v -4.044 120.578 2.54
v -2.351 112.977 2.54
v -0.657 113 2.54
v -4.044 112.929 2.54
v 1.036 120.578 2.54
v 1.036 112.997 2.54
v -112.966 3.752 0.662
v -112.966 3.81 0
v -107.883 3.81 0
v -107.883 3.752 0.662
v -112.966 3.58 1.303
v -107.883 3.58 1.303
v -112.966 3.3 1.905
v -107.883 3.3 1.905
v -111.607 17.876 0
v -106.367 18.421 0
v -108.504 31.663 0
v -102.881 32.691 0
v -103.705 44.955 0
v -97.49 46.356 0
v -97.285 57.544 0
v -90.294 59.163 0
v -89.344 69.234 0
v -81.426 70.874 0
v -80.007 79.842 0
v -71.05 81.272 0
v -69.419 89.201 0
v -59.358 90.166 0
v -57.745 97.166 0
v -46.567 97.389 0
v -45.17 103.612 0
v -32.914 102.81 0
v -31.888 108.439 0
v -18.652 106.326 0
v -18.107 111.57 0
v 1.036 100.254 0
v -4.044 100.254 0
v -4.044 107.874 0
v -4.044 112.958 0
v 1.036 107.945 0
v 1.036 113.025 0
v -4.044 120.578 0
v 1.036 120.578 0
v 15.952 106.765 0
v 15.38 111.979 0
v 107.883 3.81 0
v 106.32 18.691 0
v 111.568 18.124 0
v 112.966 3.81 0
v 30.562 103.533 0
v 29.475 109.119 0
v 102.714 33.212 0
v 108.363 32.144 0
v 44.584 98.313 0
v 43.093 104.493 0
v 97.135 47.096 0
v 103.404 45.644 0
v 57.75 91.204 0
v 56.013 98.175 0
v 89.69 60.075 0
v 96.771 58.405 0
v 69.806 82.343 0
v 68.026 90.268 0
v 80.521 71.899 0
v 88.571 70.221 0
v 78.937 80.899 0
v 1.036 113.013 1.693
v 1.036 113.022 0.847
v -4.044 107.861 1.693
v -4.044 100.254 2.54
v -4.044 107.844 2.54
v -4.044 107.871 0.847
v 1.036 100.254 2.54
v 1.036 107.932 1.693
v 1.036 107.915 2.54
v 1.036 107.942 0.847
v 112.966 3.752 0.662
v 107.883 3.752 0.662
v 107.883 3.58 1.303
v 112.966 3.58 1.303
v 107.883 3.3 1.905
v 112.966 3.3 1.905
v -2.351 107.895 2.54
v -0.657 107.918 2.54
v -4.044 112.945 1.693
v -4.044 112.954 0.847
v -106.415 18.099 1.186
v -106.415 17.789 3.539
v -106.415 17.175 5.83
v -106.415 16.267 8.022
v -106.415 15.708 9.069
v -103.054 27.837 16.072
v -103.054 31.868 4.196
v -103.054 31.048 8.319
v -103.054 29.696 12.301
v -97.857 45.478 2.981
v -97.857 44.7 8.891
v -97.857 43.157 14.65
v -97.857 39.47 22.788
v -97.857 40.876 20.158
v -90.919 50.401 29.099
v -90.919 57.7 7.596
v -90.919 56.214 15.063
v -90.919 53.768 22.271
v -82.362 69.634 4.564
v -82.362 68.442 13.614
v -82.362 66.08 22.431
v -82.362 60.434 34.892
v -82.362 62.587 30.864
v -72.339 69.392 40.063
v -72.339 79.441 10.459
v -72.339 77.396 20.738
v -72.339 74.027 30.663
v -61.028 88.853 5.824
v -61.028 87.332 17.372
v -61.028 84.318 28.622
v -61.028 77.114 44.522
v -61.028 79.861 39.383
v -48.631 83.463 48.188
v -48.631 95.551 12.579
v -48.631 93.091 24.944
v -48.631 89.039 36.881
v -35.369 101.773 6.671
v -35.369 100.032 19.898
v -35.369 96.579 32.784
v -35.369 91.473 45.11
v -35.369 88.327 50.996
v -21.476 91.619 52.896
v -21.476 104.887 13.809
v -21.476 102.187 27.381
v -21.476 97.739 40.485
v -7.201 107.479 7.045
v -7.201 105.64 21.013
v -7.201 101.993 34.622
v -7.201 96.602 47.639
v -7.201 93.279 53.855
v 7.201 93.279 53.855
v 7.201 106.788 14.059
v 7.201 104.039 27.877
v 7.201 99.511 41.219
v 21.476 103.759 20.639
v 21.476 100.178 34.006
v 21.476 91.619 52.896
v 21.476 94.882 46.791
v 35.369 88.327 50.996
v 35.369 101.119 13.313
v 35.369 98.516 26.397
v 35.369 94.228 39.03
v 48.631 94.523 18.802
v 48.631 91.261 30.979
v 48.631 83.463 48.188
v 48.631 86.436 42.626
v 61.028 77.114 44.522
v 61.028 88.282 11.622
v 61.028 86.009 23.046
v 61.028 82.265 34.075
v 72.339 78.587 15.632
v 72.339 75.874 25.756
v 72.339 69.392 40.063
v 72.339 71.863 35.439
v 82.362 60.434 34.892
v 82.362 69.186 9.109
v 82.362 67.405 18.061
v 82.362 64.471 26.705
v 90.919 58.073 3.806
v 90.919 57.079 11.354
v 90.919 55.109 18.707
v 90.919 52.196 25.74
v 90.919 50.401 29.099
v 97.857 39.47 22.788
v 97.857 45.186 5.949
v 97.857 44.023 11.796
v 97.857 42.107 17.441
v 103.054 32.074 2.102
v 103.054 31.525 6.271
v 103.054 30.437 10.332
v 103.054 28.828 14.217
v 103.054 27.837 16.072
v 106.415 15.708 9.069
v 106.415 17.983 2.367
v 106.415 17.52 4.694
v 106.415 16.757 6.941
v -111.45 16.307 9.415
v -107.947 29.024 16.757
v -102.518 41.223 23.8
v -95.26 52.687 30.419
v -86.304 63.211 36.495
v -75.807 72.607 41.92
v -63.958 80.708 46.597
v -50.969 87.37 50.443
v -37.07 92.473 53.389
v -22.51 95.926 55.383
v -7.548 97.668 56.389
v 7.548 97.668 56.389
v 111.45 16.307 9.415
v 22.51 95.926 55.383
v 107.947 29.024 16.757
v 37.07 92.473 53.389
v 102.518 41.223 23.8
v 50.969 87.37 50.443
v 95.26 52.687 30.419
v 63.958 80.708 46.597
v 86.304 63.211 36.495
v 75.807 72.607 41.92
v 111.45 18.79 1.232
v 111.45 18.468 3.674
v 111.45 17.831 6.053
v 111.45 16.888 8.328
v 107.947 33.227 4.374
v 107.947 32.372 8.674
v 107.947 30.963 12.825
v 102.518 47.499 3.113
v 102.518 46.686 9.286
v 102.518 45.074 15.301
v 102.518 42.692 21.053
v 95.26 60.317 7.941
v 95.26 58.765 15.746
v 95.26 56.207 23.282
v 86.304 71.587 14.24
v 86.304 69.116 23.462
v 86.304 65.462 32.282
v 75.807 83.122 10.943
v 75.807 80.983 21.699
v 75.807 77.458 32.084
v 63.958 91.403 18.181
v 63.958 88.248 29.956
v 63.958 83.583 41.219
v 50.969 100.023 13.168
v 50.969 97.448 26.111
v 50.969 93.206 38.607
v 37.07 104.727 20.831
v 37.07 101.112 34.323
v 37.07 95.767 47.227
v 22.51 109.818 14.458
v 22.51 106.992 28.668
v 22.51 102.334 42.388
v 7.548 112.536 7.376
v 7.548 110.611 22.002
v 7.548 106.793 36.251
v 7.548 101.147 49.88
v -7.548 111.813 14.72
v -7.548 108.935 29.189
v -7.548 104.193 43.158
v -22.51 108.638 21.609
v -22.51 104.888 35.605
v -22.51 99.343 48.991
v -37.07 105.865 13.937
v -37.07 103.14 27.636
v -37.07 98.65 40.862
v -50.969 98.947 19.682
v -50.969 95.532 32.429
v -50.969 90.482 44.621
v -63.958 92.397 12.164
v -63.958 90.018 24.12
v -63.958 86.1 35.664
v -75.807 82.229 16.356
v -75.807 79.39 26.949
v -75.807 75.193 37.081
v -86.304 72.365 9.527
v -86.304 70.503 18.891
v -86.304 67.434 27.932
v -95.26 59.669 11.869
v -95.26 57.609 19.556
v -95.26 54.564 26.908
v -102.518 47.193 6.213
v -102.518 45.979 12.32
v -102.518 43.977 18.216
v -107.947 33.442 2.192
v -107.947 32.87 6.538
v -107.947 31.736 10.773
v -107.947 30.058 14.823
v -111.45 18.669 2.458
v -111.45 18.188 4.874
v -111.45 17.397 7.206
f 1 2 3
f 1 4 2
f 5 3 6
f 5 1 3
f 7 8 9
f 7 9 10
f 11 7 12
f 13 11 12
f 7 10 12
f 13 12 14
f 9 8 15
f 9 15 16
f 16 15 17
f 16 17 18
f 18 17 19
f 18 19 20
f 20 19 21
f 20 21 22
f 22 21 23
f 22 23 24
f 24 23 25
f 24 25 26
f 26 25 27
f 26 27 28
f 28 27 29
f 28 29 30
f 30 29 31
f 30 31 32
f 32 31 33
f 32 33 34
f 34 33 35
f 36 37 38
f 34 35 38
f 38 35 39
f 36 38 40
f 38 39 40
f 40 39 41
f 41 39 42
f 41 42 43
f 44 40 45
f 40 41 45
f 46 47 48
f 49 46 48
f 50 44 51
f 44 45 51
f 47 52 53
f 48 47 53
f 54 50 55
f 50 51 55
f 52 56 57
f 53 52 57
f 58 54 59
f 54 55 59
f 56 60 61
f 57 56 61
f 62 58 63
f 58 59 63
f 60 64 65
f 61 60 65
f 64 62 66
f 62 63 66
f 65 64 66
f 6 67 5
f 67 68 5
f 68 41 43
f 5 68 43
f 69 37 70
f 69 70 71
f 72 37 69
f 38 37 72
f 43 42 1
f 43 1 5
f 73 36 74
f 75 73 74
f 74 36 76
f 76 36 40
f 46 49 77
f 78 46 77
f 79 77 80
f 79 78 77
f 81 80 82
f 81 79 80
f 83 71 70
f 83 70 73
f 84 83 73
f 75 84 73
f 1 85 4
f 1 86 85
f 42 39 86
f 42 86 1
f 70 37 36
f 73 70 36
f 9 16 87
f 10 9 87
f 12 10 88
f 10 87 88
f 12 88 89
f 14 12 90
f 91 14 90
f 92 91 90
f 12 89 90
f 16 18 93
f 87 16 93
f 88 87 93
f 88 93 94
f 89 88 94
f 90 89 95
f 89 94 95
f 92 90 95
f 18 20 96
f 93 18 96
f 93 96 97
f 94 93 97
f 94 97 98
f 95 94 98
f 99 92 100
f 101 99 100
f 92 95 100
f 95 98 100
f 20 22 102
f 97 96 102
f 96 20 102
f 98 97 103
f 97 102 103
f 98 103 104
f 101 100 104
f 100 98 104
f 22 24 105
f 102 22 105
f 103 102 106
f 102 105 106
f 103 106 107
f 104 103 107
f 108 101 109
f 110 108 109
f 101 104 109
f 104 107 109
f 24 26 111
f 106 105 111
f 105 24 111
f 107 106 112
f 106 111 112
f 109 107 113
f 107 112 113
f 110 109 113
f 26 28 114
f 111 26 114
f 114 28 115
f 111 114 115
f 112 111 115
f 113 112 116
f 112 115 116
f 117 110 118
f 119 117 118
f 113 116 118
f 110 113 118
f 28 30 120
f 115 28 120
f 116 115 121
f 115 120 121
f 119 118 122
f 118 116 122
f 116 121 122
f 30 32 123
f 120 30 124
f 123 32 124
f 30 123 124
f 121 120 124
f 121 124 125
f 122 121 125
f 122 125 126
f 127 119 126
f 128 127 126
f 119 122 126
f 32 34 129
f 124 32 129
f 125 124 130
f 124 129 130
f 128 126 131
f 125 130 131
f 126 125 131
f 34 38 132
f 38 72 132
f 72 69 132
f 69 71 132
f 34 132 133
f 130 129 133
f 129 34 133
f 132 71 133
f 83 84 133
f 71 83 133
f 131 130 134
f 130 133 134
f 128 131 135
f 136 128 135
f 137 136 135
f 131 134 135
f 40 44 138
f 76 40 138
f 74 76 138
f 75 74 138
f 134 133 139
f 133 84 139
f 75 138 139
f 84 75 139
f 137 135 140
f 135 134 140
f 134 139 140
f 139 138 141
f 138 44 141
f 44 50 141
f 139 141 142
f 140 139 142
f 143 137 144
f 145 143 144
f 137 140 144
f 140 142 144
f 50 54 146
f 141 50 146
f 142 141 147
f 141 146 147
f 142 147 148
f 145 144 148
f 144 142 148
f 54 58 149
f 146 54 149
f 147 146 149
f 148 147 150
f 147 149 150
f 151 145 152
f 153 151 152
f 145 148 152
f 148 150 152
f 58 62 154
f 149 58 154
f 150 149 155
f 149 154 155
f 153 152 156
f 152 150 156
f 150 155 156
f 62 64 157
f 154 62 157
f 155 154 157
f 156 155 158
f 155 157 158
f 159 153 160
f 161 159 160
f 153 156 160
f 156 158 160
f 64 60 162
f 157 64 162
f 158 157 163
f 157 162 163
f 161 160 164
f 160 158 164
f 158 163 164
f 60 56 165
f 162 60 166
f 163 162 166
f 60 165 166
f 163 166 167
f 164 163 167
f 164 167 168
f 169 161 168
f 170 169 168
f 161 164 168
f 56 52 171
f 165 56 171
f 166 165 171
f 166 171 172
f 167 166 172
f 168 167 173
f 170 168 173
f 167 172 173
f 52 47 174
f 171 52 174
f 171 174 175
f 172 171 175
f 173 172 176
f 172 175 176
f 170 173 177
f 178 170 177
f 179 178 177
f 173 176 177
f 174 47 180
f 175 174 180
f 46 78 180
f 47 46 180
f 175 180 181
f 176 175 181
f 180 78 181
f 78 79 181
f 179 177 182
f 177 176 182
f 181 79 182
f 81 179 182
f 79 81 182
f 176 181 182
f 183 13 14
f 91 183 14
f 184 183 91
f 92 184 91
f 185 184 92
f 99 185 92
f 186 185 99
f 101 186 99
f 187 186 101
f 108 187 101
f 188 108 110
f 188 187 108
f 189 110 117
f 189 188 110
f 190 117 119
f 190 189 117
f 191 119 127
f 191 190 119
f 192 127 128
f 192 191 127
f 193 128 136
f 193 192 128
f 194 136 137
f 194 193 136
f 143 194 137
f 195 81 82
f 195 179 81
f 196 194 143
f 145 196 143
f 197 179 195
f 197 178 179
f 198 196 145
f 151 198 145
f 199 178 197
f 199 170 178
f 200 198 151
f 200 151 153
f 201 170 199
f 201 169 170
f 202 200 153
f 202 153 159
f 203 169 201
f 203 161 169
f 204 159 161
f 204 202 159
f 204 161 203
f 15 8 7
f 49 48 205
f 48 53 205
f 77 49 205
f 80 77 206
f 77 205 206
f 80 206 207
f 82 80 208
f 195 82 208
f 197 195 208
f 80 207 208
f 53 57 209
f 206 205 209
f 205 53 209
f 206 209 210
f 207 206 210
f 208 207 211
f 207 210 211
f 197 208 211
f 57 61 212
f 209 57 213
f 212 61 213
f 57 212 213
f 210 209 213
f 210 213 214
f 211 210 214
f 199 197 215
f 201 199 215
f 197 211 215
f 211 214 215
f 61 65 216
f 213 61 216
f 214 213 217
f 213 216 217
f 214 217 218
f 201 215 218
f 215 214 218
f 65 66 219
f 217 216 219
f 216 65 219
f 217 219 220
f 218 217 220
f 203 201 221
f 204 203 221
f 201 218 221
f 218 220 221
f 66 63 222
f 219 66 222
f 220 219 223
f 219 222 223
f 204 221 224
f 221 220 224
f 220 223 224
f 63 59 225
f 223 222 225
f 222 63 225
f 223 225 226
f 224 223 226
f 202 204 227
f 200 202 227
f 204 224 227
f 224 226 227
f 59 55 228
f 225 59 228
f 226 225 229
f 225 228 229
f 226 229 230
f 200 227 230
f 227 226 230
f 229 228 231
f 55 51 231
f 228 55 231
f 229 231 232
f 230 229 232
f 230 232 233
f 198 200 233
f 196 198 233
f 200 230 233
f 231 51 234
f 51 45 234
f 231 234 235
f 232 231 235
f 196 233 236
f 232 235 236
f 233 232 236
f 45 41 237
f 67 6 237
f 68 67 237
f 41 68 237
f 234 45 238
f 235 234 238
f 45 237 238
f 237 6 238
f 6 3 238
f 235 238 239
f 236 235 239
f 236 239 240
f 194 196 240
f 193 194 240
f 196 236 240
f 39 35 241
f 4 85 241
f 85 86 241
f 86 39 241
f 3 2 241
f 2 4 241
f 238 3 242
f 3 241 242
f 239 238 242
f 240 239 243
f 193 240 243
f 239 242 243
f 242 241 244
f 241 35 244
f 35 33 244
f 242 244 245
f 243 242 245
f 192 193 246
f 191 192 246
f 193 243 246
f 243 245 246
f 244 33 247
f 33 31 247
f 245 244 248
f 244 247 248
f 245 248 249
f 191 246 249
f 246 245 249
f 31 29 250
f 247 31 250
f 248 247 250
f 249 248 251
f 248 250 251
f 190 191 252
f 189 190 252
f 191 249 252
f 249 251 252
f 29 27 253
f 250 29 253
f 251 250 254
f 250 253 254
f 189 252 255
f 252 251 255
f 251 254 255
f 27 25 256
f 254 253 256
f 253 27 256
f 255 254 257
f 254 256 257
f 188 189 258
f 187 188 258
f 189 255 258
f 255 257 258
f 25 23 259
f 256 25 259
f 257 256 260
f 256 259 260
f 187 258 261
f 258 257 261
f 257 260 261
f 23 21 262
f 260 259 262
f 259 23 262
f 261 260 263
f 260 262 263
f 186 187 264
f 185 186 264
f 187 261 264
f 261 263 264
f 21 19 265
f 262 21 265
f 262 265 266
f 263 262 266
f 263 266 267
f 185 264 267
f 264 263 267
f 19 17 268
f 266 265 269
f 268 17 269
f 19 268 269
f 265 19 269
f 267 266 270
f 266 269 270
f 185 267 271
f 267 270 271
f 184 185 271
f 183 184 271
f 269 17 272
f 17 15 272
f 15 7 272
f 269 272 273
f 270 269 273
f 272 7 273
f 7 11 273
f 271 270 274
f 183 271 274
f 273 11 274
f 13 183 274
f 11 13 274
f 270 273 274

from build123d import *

# Parameters (mm, degrees)
F1_ANGLE      = 30
F2_R          = 3.81
F3_DEPTH      = 113.031
F3_DEPTH_BACK = 113.031
F4_W          = 5.08
F4_H          = 20.3234071666
F5_DEPTH      = 2.54


with BuildPart() as f1:
    # F0 (on Top) → F1 (revolve)
    with BuildSketch(Plane.XY):
        with BuildLine():
            Line((-113.03, 0), (-107.95, 0))
            ThreePointArc((-107.95, 0), (0, 107.95), (107.95, 0))
            Line((107.95, 0), (113.03, 0))
            ThreePointArc((113.03, 0), (0, 113.03), (-113.03, 0))
        make_face()
    revolve(axis=Axis((-53.975, 0, 0), (1, 0, 0)), revolution_arc=F1_ANGLE)

    # F2 (on Right) → F3 (cut, two sides)
    with BuildSketch(Plane.YZ) as f3_sk:
        Circle(F2_R)
    extrude(amount=-F3_DEPTH, mode=Mode.SUBTRACT)
    extrude(f3_sk.sketch, amount=F3_DEPTH_BACK, mode=Mode.SUBTRACT)

    # F4 (on Top) → F5 (join)
    with BuildSketch(Plane.XY):
        with Locations((-1.5036120401, 110.4159437969)):
            Rectangle(F4_W, F4_H)
    extrude(amount=F5_DEPTH)


solid = f1.part
